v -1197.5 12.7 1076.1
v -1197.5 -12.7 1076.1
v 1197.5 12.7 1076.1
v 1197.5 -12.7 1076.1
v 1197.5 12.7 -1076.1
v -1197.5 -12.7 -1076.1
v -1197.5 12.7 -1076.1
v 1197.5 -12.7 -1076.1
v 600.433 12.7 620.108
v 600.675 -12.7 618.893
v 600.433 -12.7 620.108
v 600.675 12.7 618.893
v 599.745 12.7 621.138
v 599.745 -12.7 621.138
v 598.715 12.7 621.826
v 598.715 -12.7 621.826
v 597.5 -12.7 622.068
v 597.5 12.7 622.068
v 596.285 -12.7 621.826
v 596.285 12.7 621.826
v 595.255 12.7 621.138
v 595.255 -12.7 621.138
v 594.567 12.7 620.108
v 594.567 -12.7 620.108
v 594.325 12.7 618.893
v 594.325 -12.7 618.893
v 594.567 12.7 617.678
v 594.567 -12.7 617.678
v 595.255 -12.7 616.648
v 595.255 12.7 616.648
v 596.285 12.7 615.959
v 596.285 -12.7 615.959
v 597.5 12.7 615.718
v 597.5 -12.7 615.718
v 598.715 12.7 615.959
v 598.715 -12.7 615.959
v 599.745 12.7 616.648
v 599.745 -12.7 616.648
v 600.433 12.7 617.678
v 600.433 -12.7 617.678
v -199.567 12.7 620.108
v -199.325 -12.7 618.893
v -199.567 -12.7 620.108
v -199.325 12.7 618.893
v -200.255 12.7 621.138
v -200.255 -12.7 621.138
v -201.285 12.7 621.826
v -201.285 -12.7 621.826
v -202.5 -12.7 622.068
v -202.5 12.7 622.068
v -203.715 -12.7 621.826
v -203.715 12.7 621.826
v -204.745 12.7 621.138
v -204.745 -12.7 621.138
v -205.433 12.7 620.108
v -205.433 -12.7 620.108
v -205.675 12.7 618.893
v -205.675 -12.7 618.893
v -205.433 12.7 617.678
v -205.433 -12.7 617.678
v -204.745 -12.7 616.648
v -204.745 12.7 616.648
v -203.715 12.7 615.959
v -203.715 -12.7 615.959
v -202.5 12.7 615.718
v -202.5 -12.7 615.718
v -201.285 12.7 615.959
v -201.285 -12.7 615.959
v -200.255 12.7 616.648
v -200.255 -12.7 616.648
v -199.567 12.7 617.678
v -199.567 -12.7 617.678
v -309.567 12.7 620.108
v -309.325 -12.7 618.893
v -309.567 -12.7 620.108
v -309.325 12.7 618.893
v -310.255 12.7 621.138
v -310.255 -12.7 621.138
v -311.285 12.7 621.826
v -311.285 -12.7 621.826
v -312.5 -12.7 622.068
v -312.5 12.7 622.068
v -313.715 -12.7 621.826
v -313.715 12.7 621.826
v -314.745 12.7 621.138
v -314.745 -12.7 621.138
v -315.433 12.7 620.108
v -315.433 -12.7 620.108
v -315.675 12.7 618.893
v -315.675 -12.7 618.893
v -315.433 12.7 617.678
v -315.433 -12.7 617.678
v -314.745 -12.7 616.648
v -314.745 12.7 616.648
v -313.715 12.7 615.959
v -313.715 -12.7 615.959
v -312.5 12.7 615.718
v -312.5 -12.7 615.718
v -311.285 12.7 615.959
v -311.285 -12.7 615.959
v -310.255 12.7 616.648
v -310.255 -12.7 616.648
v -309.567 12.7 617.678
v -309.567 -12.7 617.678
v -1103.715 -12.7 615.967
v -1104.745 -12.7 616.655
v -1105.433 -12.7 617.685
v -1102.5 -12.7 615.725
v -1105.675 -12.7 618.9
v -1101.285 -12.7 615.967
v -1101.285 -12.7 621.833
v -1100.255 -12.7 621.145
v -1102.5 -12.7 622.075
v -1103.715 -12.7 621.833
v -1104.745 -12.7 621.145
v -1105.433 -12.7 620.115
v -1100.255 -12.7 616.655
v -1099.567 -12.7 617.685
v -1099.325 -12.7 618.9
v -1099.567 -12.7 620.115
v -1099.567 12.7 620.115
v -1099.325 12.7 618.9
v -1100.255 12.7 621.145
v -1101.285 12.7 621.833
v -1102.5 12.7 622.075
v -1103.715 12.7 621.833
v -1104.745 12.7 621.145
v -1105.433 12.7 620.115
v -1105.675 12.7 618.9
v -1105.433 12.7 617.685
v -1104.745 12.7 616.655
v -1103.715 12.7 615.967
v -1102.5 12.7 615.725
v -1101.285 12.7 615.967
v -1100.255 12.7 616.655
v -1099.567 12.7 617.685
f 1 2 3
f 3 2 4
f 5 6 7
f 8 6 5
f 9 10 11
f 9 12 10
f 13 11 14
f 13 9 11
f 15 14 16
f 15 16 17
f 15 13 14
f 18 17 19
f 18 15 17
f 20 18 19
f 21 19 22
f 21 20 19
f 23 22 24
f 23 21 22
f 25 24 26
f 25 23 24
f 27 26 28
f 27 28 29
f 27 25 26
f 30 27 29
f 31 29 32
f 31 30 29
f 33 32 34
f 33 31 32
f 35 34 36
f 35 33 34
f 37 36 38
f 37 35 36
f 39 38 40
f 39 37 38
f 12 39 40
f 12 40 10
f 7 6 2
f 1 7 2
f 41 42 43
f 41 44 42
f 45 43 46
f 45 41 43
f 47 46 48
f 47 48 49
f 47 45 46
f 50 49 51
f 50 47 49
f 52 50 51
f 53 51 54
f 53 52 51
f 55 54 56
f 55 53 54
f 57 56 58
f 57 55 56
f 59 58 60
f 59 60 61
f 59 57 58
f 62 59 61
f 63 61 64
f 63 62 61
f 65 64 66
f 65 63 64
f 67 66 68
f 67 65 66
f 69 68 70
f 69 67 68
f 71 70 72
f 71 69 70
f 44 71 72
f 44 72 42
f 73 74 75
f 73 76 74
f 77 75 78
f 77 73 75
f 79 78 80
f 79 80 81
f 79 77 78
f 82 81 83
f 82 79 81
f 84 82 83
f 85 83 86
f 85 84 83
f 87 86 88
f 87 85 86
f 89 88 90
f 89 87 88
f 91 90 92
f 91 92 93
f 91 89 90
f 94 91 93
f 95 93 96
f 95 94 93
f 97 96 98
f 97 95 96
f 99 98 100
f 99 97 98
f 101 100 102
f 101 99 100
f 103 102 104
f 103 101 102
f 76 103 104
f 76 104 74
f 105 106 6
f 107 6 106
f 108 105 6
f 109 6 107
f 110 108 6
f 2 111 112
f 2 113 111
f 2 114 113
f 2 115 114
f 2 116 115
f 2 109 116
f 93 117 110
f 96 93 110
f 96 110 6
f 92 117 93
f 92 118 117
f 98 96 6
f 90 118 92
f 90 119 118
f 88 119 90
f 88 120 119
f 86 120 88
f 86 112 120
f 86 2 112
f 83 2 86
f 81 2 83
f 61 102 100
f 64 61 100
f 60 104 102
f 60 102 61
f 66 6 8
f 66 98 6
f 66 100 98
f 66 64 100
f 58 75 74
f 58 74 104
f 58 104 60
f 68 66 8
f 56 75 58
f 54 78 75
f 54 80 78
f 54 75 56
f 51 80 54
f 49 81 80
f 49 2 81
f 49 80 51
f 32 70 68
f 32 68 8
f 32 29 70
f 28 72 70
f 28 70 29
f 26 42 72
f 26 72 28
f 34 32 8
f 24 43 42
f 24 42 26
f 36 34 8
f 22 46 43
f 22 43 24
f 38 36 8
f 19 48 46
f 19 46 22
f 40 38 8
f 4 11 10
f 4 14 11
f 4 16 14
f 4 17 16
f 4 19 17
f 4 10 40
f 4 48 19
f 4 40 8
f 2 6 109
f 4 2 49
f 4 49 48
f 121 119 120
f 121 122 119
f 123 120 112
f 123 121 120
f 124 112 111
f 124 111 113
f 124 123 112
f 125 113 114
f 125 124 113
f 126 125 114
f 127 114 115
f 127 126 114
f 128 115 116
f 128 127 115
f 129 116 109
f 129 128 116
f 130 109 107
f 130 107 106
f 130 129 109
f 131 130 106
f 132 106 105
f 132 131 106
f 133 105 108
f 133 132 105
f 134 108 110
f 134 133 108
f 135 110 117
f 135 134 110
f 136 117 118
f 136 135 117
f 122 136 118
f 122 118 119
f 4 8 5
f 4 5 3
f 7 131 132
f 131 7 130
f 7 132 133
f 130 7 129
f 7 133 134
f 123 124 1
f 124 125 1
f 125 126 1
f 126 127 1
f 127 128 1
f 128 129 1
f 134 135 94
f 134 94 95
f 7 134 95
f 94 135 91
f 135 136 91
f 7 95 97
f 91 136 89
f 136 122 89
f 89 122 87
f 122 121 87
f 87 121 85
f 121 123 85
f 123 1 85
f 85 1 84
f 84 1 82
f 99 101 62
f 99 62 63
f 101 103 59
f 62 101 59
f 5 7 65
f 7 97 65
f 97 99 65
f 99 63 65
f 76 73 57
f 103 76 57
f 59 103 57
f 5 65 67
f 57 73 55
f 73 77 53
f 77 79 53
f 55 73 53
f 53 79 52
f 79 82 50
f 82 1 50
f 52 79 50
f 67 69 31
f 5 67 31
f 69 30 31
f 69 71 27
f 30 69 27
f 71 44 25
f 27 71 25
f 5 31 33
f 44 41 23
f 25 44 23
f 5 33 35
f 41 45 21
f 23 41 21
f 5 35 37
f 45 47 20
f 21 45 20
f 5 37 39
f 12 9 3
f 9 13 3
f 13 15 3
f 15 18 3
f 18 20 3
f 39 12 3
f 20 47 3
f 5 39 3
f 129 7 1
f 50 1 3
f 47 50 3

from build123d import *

# Parameters (mm, degrees)
F0_W     = 2395
F0_H     = 2152.2
F0_R     = 3.175
F1_DEPTH = 12.7


with BuildPart() as f1:
    # F0 (on Front) → F1 (new body, symmetric)
    with BuildSketch(Plane.XZ):
        Rectangle(F0_W, F0_H)
        with Locations((-1102.5, 618.9)):
            Circle(F0_R, mode=Mode.SUBTRACT)
        with Locations((-312.5, 618.8928)):
            Circle(F0_R, mode=Mode.SUBTRACT)
        with Locations((-202.5, 618.8928)):
            Circle(F0_R, mode=Mode.SUBTRACT)
        with Locations((597.5, 618.8928)):
            Circle(F0_R, mode=Mode.SUBTRACT)
    extrude(amount=F1_DEPTH, both=True)


solid = f1.part
